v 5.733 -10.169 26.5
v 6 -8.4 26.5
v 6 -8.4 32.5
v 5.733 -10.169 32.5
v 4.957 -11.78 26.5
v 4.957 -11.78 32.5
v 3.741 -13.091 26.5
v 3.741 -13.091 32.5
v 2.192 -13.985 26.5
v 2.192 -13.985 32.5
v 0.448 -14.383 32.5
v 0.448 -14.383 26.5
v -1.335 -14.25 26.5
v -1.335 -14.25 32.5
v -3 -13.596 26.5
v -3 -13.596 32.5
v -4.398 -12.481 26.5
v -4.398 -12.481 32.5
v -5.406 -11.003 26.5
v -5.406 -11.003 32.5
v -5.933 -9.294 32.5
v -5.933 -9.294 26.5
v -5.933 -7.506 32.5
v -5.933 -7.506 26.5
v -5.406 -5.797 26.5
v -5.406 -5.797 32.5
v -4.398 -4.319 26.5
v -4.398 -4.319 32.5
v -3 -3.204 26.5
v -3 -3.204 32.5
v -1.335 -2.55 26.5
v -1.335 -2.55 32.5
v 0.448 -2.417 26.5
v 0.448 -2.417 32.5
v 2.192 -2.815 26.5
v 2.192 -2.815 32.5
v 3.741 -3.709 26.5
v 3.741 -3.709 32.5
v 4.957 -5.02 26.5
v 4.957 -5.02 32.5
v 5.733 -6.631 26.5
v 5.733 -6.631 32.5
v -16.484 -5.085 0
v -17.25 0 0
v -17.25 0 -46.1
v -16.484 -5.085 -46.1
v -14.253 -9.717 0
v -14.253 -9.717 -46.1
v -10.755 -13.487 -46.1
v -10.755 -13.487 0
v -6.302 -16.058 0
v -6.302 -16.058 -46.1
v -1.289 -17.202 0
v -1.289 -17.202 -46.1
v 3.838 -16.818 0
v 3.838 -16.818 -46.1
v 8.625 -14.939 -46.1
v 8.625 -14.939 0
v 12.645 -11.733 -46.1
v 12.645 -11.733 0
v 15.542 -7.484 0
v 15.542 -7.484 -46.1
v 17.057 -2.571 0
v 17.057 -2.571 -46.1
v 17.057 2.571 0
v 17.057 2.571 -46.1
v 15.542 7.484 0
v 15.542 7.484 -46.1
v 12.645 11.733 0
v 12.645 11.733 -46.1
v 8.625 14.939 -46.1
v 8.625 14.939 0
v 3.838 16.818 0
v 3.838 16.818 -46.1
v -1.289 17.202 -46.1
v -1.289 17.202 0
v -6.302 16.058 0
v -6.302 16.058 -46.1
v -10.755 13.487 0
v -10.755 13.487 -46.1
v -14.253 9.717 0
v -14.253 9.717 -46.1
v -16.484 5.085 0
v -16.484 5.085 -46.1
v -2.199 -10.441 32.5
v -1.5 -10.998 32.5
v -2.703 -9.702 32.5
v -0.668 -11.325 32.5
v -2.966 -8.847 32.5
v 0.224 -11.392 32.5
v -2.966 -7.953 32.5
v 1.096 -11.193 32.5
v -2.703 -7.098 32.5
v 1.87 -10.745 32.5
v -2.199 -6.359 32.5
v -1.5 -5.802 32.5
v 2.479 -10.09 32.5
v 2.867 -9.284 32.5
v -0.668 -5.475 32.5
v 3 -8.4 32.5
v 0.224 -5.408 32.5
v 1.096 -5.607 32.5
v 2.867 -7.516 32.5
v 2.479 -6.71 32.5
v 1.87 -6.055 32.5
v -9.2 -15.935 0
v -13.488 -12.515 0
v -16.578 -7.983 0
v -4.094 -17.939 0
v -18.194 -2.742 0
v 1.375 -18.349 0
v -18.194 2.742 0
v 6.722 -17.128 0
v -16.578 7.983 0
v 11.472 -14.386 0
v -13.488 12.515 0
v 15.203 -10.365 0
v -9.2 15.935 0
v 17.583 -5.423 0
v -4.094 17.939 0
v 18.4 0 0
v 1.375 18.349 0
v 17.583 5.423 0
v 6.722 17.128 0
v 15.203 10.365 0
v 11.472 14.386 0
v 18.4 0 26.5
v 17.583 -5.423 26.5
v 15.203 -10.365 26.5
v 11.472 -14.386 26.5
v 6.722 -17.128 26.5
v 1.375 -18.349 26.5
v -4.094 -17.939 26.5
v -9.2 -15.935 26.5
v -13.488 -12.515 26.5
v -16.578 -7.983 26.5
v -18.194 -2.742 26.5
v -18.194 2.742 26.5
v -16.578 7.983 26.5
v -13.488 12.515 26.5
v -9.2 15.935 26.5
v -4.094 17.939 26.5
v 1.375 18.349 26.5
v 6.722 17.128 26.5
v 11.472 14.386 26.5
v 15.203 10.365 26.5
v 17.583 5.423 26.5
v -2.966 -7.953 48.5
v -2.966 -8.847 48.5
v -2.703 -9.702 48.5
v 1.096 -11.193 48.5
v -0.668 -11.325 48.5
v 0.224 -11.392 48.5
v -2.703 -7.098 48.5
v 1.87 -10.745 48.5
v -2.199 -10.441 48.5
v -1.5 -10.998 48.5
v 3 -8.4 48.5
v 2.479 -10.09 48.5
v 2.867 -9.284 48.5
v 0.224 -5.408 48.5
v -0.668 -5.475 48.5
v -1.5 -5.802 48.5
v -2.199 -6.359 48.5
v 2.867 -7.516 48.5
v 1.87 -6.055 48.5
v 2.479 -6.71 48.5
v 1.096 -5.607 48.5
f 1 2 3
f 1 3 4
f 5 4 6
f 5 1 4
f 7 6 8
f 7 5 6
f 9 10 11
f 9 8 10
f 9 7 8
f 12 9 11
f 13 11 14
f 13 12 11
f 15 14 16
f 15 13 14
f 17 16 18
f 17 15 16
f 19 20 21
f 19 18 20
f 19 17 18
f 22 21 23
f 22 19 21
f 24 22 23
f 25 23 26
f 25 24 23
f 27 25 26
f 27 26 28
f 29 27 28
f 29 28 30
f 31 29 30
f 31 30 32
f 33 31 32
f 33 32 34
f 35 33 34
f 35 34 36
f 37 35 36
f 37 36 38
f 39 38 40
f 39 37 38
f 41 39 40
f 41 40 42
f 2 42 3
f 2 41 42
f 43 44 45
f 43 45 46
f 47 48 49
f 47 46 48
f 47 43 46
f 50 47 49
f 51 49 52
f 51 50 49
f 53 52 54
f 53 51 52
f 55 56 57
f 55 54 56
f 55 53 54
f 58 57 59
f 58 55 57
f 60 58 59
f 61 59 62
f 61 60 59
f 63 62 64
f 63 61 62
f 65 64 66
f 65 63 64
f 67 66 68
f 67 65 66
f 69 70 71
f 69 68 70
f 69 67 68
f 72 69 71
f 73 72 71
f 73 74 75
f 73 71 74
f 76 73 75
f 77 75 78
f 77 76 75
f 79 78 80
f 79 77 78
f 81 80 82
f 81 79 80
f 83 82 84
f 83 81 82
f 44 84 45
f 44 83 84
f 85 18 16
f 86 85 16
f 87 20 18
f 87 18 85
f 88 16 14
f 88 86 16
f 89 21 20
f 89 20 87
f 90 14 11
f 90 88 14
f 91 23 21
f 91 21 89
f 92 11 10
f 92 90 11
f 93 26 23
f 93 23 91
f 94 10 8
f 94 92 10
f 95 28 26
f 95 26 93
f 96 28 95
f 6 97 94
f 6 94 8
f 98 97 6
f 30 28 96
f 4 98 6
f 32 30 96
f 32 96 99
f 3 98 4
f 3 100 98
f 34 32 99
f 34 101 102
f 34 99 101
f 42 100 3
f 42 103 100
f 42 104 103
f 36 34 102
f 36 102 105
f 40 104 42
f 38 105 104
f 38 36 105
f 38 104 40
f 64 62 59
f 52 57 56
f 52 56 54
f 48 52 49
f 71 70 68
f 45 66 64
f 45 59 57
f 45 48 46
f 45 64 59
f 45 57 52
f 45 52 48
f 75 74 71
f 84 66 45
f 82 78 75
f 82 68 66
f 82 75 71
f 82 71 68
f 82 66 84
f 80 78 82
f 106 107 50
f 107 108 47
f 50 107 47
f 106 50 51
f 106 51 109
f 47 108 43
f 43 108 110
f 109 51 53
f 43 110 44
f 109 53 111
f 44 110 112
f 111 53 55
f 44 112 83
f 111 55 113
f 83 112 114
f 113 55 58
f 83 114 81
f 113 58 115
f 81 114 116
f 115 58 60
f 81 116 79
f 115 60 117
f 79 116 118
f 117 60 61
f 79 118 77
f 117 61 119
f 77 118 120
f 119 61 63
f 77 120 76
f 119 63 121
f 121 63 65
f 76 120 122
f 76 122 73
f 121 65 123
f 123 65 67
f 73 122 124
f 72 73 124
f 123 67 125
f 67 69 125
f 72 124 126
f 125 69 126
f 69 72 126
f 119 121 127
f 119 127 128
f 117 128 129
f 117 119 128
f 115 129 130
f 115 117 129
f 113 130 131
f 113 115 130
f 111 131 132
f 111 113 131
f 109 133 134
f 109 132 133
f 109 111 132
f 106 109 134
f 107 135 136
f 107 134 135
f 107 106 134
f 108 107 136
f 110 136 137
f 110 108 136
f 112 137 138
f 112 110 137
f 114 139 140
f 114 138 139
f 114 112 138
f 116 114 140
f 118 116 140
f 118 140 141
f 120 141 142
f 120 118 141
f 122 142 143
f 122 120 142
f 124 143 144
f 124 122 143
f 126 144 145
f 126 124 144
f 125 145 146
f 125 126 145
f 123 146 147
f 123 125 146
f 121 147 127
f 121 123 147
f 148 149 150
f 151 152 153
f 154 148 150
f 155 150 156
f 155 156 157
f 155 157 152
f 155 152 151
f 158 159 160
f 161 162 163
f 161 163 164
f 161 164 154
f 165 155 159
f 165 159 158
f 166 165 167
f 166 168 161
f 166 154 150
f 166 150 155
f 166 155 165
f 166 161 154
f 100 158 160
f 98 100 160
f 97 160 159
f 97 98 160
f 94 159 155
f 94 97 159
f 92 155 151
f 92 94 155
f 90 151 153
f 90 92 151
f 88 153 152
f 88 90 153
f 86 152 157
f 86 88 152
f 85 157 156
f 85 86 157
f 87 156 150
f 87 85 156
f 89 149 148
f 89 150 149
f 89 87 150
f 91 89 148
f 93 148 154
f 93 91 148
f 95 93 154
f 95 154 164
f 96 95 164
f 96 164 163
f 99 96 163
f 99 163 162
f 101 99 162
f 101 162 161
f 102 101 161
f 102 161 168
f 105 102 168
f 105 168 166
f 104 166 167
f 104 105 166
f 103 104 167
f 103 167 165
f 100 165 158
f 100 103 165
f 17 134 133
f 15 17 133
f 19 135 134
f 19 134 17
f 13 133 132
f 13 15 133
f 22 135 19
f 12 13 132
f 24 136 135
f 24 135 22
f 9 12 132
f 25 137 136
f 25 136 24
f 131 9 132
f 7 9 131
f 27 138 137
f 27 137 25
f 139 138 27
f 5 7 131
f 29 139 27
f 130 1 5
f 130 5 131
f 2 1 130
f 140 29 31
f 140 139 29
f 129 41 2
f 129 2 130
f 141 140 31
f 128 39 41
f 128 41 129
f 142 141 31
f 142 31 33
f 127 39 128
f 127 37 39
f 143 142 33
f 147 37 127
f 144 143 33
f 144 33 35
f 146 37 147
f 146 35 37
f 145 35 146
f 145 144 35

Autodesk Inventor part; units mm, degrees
ref_plane "YZ Plane" through (0, 0, 0) normal (1, 0, 0) x (0, 1, 0)
ref_plane "XZ Plane" through (0, 0, 0) normal (0, 1, 0) x (-1, 0, 0)
ref_plane "XY Plane" through (0, 0, 0) normal (0, 0, 1) x (1, 0, 0)
sketch "Sketch1" plane through (0, 0, 0) normal (0, 0, 1) x (1, 0, 0)
  circle A0 centre (0, 0) radius 18.4
  dimension "d0" = 36.8
extrude "Extrusion1" add sketch "Sketch1" along normal blind 26.5
sketch "Sketch2" plane through (0, 0, 0) normal (0, 0, -1) x (-1, 0, 0)
  circle A0 centre (0, 0) radius 17.25
  dimension "d3" = 34.5
extrude "Extrusion2" add sketch "Sketch2" along normal blind 46.1
sketch "Sketch5" plane through (0, 0, 26.5) normal (0, 0, 1) x (1, 0, 0)
  circle A0 centre (0, -8.4) radius 3
  circle A1 centre (0, -8.4) radius 6
  dimension "d7" = 6
  dimension "d8" = 12
extrude "Extrusion3" add sketch "Sketch5" along normal blind 6 contours A0 | A1
sketch "Sketch6" plane through (0, -8.4, 32.5) normal (0, 0, 1) x (1, 0, 0)
  circle A0 centre (0, 0) radius 3
  point P0 (0, 8.4)
  dimension "d11" = 6
extrude "Extrusion4" add sketch "Sketch6" along normal blind 16
properties part number "Big Motor"
